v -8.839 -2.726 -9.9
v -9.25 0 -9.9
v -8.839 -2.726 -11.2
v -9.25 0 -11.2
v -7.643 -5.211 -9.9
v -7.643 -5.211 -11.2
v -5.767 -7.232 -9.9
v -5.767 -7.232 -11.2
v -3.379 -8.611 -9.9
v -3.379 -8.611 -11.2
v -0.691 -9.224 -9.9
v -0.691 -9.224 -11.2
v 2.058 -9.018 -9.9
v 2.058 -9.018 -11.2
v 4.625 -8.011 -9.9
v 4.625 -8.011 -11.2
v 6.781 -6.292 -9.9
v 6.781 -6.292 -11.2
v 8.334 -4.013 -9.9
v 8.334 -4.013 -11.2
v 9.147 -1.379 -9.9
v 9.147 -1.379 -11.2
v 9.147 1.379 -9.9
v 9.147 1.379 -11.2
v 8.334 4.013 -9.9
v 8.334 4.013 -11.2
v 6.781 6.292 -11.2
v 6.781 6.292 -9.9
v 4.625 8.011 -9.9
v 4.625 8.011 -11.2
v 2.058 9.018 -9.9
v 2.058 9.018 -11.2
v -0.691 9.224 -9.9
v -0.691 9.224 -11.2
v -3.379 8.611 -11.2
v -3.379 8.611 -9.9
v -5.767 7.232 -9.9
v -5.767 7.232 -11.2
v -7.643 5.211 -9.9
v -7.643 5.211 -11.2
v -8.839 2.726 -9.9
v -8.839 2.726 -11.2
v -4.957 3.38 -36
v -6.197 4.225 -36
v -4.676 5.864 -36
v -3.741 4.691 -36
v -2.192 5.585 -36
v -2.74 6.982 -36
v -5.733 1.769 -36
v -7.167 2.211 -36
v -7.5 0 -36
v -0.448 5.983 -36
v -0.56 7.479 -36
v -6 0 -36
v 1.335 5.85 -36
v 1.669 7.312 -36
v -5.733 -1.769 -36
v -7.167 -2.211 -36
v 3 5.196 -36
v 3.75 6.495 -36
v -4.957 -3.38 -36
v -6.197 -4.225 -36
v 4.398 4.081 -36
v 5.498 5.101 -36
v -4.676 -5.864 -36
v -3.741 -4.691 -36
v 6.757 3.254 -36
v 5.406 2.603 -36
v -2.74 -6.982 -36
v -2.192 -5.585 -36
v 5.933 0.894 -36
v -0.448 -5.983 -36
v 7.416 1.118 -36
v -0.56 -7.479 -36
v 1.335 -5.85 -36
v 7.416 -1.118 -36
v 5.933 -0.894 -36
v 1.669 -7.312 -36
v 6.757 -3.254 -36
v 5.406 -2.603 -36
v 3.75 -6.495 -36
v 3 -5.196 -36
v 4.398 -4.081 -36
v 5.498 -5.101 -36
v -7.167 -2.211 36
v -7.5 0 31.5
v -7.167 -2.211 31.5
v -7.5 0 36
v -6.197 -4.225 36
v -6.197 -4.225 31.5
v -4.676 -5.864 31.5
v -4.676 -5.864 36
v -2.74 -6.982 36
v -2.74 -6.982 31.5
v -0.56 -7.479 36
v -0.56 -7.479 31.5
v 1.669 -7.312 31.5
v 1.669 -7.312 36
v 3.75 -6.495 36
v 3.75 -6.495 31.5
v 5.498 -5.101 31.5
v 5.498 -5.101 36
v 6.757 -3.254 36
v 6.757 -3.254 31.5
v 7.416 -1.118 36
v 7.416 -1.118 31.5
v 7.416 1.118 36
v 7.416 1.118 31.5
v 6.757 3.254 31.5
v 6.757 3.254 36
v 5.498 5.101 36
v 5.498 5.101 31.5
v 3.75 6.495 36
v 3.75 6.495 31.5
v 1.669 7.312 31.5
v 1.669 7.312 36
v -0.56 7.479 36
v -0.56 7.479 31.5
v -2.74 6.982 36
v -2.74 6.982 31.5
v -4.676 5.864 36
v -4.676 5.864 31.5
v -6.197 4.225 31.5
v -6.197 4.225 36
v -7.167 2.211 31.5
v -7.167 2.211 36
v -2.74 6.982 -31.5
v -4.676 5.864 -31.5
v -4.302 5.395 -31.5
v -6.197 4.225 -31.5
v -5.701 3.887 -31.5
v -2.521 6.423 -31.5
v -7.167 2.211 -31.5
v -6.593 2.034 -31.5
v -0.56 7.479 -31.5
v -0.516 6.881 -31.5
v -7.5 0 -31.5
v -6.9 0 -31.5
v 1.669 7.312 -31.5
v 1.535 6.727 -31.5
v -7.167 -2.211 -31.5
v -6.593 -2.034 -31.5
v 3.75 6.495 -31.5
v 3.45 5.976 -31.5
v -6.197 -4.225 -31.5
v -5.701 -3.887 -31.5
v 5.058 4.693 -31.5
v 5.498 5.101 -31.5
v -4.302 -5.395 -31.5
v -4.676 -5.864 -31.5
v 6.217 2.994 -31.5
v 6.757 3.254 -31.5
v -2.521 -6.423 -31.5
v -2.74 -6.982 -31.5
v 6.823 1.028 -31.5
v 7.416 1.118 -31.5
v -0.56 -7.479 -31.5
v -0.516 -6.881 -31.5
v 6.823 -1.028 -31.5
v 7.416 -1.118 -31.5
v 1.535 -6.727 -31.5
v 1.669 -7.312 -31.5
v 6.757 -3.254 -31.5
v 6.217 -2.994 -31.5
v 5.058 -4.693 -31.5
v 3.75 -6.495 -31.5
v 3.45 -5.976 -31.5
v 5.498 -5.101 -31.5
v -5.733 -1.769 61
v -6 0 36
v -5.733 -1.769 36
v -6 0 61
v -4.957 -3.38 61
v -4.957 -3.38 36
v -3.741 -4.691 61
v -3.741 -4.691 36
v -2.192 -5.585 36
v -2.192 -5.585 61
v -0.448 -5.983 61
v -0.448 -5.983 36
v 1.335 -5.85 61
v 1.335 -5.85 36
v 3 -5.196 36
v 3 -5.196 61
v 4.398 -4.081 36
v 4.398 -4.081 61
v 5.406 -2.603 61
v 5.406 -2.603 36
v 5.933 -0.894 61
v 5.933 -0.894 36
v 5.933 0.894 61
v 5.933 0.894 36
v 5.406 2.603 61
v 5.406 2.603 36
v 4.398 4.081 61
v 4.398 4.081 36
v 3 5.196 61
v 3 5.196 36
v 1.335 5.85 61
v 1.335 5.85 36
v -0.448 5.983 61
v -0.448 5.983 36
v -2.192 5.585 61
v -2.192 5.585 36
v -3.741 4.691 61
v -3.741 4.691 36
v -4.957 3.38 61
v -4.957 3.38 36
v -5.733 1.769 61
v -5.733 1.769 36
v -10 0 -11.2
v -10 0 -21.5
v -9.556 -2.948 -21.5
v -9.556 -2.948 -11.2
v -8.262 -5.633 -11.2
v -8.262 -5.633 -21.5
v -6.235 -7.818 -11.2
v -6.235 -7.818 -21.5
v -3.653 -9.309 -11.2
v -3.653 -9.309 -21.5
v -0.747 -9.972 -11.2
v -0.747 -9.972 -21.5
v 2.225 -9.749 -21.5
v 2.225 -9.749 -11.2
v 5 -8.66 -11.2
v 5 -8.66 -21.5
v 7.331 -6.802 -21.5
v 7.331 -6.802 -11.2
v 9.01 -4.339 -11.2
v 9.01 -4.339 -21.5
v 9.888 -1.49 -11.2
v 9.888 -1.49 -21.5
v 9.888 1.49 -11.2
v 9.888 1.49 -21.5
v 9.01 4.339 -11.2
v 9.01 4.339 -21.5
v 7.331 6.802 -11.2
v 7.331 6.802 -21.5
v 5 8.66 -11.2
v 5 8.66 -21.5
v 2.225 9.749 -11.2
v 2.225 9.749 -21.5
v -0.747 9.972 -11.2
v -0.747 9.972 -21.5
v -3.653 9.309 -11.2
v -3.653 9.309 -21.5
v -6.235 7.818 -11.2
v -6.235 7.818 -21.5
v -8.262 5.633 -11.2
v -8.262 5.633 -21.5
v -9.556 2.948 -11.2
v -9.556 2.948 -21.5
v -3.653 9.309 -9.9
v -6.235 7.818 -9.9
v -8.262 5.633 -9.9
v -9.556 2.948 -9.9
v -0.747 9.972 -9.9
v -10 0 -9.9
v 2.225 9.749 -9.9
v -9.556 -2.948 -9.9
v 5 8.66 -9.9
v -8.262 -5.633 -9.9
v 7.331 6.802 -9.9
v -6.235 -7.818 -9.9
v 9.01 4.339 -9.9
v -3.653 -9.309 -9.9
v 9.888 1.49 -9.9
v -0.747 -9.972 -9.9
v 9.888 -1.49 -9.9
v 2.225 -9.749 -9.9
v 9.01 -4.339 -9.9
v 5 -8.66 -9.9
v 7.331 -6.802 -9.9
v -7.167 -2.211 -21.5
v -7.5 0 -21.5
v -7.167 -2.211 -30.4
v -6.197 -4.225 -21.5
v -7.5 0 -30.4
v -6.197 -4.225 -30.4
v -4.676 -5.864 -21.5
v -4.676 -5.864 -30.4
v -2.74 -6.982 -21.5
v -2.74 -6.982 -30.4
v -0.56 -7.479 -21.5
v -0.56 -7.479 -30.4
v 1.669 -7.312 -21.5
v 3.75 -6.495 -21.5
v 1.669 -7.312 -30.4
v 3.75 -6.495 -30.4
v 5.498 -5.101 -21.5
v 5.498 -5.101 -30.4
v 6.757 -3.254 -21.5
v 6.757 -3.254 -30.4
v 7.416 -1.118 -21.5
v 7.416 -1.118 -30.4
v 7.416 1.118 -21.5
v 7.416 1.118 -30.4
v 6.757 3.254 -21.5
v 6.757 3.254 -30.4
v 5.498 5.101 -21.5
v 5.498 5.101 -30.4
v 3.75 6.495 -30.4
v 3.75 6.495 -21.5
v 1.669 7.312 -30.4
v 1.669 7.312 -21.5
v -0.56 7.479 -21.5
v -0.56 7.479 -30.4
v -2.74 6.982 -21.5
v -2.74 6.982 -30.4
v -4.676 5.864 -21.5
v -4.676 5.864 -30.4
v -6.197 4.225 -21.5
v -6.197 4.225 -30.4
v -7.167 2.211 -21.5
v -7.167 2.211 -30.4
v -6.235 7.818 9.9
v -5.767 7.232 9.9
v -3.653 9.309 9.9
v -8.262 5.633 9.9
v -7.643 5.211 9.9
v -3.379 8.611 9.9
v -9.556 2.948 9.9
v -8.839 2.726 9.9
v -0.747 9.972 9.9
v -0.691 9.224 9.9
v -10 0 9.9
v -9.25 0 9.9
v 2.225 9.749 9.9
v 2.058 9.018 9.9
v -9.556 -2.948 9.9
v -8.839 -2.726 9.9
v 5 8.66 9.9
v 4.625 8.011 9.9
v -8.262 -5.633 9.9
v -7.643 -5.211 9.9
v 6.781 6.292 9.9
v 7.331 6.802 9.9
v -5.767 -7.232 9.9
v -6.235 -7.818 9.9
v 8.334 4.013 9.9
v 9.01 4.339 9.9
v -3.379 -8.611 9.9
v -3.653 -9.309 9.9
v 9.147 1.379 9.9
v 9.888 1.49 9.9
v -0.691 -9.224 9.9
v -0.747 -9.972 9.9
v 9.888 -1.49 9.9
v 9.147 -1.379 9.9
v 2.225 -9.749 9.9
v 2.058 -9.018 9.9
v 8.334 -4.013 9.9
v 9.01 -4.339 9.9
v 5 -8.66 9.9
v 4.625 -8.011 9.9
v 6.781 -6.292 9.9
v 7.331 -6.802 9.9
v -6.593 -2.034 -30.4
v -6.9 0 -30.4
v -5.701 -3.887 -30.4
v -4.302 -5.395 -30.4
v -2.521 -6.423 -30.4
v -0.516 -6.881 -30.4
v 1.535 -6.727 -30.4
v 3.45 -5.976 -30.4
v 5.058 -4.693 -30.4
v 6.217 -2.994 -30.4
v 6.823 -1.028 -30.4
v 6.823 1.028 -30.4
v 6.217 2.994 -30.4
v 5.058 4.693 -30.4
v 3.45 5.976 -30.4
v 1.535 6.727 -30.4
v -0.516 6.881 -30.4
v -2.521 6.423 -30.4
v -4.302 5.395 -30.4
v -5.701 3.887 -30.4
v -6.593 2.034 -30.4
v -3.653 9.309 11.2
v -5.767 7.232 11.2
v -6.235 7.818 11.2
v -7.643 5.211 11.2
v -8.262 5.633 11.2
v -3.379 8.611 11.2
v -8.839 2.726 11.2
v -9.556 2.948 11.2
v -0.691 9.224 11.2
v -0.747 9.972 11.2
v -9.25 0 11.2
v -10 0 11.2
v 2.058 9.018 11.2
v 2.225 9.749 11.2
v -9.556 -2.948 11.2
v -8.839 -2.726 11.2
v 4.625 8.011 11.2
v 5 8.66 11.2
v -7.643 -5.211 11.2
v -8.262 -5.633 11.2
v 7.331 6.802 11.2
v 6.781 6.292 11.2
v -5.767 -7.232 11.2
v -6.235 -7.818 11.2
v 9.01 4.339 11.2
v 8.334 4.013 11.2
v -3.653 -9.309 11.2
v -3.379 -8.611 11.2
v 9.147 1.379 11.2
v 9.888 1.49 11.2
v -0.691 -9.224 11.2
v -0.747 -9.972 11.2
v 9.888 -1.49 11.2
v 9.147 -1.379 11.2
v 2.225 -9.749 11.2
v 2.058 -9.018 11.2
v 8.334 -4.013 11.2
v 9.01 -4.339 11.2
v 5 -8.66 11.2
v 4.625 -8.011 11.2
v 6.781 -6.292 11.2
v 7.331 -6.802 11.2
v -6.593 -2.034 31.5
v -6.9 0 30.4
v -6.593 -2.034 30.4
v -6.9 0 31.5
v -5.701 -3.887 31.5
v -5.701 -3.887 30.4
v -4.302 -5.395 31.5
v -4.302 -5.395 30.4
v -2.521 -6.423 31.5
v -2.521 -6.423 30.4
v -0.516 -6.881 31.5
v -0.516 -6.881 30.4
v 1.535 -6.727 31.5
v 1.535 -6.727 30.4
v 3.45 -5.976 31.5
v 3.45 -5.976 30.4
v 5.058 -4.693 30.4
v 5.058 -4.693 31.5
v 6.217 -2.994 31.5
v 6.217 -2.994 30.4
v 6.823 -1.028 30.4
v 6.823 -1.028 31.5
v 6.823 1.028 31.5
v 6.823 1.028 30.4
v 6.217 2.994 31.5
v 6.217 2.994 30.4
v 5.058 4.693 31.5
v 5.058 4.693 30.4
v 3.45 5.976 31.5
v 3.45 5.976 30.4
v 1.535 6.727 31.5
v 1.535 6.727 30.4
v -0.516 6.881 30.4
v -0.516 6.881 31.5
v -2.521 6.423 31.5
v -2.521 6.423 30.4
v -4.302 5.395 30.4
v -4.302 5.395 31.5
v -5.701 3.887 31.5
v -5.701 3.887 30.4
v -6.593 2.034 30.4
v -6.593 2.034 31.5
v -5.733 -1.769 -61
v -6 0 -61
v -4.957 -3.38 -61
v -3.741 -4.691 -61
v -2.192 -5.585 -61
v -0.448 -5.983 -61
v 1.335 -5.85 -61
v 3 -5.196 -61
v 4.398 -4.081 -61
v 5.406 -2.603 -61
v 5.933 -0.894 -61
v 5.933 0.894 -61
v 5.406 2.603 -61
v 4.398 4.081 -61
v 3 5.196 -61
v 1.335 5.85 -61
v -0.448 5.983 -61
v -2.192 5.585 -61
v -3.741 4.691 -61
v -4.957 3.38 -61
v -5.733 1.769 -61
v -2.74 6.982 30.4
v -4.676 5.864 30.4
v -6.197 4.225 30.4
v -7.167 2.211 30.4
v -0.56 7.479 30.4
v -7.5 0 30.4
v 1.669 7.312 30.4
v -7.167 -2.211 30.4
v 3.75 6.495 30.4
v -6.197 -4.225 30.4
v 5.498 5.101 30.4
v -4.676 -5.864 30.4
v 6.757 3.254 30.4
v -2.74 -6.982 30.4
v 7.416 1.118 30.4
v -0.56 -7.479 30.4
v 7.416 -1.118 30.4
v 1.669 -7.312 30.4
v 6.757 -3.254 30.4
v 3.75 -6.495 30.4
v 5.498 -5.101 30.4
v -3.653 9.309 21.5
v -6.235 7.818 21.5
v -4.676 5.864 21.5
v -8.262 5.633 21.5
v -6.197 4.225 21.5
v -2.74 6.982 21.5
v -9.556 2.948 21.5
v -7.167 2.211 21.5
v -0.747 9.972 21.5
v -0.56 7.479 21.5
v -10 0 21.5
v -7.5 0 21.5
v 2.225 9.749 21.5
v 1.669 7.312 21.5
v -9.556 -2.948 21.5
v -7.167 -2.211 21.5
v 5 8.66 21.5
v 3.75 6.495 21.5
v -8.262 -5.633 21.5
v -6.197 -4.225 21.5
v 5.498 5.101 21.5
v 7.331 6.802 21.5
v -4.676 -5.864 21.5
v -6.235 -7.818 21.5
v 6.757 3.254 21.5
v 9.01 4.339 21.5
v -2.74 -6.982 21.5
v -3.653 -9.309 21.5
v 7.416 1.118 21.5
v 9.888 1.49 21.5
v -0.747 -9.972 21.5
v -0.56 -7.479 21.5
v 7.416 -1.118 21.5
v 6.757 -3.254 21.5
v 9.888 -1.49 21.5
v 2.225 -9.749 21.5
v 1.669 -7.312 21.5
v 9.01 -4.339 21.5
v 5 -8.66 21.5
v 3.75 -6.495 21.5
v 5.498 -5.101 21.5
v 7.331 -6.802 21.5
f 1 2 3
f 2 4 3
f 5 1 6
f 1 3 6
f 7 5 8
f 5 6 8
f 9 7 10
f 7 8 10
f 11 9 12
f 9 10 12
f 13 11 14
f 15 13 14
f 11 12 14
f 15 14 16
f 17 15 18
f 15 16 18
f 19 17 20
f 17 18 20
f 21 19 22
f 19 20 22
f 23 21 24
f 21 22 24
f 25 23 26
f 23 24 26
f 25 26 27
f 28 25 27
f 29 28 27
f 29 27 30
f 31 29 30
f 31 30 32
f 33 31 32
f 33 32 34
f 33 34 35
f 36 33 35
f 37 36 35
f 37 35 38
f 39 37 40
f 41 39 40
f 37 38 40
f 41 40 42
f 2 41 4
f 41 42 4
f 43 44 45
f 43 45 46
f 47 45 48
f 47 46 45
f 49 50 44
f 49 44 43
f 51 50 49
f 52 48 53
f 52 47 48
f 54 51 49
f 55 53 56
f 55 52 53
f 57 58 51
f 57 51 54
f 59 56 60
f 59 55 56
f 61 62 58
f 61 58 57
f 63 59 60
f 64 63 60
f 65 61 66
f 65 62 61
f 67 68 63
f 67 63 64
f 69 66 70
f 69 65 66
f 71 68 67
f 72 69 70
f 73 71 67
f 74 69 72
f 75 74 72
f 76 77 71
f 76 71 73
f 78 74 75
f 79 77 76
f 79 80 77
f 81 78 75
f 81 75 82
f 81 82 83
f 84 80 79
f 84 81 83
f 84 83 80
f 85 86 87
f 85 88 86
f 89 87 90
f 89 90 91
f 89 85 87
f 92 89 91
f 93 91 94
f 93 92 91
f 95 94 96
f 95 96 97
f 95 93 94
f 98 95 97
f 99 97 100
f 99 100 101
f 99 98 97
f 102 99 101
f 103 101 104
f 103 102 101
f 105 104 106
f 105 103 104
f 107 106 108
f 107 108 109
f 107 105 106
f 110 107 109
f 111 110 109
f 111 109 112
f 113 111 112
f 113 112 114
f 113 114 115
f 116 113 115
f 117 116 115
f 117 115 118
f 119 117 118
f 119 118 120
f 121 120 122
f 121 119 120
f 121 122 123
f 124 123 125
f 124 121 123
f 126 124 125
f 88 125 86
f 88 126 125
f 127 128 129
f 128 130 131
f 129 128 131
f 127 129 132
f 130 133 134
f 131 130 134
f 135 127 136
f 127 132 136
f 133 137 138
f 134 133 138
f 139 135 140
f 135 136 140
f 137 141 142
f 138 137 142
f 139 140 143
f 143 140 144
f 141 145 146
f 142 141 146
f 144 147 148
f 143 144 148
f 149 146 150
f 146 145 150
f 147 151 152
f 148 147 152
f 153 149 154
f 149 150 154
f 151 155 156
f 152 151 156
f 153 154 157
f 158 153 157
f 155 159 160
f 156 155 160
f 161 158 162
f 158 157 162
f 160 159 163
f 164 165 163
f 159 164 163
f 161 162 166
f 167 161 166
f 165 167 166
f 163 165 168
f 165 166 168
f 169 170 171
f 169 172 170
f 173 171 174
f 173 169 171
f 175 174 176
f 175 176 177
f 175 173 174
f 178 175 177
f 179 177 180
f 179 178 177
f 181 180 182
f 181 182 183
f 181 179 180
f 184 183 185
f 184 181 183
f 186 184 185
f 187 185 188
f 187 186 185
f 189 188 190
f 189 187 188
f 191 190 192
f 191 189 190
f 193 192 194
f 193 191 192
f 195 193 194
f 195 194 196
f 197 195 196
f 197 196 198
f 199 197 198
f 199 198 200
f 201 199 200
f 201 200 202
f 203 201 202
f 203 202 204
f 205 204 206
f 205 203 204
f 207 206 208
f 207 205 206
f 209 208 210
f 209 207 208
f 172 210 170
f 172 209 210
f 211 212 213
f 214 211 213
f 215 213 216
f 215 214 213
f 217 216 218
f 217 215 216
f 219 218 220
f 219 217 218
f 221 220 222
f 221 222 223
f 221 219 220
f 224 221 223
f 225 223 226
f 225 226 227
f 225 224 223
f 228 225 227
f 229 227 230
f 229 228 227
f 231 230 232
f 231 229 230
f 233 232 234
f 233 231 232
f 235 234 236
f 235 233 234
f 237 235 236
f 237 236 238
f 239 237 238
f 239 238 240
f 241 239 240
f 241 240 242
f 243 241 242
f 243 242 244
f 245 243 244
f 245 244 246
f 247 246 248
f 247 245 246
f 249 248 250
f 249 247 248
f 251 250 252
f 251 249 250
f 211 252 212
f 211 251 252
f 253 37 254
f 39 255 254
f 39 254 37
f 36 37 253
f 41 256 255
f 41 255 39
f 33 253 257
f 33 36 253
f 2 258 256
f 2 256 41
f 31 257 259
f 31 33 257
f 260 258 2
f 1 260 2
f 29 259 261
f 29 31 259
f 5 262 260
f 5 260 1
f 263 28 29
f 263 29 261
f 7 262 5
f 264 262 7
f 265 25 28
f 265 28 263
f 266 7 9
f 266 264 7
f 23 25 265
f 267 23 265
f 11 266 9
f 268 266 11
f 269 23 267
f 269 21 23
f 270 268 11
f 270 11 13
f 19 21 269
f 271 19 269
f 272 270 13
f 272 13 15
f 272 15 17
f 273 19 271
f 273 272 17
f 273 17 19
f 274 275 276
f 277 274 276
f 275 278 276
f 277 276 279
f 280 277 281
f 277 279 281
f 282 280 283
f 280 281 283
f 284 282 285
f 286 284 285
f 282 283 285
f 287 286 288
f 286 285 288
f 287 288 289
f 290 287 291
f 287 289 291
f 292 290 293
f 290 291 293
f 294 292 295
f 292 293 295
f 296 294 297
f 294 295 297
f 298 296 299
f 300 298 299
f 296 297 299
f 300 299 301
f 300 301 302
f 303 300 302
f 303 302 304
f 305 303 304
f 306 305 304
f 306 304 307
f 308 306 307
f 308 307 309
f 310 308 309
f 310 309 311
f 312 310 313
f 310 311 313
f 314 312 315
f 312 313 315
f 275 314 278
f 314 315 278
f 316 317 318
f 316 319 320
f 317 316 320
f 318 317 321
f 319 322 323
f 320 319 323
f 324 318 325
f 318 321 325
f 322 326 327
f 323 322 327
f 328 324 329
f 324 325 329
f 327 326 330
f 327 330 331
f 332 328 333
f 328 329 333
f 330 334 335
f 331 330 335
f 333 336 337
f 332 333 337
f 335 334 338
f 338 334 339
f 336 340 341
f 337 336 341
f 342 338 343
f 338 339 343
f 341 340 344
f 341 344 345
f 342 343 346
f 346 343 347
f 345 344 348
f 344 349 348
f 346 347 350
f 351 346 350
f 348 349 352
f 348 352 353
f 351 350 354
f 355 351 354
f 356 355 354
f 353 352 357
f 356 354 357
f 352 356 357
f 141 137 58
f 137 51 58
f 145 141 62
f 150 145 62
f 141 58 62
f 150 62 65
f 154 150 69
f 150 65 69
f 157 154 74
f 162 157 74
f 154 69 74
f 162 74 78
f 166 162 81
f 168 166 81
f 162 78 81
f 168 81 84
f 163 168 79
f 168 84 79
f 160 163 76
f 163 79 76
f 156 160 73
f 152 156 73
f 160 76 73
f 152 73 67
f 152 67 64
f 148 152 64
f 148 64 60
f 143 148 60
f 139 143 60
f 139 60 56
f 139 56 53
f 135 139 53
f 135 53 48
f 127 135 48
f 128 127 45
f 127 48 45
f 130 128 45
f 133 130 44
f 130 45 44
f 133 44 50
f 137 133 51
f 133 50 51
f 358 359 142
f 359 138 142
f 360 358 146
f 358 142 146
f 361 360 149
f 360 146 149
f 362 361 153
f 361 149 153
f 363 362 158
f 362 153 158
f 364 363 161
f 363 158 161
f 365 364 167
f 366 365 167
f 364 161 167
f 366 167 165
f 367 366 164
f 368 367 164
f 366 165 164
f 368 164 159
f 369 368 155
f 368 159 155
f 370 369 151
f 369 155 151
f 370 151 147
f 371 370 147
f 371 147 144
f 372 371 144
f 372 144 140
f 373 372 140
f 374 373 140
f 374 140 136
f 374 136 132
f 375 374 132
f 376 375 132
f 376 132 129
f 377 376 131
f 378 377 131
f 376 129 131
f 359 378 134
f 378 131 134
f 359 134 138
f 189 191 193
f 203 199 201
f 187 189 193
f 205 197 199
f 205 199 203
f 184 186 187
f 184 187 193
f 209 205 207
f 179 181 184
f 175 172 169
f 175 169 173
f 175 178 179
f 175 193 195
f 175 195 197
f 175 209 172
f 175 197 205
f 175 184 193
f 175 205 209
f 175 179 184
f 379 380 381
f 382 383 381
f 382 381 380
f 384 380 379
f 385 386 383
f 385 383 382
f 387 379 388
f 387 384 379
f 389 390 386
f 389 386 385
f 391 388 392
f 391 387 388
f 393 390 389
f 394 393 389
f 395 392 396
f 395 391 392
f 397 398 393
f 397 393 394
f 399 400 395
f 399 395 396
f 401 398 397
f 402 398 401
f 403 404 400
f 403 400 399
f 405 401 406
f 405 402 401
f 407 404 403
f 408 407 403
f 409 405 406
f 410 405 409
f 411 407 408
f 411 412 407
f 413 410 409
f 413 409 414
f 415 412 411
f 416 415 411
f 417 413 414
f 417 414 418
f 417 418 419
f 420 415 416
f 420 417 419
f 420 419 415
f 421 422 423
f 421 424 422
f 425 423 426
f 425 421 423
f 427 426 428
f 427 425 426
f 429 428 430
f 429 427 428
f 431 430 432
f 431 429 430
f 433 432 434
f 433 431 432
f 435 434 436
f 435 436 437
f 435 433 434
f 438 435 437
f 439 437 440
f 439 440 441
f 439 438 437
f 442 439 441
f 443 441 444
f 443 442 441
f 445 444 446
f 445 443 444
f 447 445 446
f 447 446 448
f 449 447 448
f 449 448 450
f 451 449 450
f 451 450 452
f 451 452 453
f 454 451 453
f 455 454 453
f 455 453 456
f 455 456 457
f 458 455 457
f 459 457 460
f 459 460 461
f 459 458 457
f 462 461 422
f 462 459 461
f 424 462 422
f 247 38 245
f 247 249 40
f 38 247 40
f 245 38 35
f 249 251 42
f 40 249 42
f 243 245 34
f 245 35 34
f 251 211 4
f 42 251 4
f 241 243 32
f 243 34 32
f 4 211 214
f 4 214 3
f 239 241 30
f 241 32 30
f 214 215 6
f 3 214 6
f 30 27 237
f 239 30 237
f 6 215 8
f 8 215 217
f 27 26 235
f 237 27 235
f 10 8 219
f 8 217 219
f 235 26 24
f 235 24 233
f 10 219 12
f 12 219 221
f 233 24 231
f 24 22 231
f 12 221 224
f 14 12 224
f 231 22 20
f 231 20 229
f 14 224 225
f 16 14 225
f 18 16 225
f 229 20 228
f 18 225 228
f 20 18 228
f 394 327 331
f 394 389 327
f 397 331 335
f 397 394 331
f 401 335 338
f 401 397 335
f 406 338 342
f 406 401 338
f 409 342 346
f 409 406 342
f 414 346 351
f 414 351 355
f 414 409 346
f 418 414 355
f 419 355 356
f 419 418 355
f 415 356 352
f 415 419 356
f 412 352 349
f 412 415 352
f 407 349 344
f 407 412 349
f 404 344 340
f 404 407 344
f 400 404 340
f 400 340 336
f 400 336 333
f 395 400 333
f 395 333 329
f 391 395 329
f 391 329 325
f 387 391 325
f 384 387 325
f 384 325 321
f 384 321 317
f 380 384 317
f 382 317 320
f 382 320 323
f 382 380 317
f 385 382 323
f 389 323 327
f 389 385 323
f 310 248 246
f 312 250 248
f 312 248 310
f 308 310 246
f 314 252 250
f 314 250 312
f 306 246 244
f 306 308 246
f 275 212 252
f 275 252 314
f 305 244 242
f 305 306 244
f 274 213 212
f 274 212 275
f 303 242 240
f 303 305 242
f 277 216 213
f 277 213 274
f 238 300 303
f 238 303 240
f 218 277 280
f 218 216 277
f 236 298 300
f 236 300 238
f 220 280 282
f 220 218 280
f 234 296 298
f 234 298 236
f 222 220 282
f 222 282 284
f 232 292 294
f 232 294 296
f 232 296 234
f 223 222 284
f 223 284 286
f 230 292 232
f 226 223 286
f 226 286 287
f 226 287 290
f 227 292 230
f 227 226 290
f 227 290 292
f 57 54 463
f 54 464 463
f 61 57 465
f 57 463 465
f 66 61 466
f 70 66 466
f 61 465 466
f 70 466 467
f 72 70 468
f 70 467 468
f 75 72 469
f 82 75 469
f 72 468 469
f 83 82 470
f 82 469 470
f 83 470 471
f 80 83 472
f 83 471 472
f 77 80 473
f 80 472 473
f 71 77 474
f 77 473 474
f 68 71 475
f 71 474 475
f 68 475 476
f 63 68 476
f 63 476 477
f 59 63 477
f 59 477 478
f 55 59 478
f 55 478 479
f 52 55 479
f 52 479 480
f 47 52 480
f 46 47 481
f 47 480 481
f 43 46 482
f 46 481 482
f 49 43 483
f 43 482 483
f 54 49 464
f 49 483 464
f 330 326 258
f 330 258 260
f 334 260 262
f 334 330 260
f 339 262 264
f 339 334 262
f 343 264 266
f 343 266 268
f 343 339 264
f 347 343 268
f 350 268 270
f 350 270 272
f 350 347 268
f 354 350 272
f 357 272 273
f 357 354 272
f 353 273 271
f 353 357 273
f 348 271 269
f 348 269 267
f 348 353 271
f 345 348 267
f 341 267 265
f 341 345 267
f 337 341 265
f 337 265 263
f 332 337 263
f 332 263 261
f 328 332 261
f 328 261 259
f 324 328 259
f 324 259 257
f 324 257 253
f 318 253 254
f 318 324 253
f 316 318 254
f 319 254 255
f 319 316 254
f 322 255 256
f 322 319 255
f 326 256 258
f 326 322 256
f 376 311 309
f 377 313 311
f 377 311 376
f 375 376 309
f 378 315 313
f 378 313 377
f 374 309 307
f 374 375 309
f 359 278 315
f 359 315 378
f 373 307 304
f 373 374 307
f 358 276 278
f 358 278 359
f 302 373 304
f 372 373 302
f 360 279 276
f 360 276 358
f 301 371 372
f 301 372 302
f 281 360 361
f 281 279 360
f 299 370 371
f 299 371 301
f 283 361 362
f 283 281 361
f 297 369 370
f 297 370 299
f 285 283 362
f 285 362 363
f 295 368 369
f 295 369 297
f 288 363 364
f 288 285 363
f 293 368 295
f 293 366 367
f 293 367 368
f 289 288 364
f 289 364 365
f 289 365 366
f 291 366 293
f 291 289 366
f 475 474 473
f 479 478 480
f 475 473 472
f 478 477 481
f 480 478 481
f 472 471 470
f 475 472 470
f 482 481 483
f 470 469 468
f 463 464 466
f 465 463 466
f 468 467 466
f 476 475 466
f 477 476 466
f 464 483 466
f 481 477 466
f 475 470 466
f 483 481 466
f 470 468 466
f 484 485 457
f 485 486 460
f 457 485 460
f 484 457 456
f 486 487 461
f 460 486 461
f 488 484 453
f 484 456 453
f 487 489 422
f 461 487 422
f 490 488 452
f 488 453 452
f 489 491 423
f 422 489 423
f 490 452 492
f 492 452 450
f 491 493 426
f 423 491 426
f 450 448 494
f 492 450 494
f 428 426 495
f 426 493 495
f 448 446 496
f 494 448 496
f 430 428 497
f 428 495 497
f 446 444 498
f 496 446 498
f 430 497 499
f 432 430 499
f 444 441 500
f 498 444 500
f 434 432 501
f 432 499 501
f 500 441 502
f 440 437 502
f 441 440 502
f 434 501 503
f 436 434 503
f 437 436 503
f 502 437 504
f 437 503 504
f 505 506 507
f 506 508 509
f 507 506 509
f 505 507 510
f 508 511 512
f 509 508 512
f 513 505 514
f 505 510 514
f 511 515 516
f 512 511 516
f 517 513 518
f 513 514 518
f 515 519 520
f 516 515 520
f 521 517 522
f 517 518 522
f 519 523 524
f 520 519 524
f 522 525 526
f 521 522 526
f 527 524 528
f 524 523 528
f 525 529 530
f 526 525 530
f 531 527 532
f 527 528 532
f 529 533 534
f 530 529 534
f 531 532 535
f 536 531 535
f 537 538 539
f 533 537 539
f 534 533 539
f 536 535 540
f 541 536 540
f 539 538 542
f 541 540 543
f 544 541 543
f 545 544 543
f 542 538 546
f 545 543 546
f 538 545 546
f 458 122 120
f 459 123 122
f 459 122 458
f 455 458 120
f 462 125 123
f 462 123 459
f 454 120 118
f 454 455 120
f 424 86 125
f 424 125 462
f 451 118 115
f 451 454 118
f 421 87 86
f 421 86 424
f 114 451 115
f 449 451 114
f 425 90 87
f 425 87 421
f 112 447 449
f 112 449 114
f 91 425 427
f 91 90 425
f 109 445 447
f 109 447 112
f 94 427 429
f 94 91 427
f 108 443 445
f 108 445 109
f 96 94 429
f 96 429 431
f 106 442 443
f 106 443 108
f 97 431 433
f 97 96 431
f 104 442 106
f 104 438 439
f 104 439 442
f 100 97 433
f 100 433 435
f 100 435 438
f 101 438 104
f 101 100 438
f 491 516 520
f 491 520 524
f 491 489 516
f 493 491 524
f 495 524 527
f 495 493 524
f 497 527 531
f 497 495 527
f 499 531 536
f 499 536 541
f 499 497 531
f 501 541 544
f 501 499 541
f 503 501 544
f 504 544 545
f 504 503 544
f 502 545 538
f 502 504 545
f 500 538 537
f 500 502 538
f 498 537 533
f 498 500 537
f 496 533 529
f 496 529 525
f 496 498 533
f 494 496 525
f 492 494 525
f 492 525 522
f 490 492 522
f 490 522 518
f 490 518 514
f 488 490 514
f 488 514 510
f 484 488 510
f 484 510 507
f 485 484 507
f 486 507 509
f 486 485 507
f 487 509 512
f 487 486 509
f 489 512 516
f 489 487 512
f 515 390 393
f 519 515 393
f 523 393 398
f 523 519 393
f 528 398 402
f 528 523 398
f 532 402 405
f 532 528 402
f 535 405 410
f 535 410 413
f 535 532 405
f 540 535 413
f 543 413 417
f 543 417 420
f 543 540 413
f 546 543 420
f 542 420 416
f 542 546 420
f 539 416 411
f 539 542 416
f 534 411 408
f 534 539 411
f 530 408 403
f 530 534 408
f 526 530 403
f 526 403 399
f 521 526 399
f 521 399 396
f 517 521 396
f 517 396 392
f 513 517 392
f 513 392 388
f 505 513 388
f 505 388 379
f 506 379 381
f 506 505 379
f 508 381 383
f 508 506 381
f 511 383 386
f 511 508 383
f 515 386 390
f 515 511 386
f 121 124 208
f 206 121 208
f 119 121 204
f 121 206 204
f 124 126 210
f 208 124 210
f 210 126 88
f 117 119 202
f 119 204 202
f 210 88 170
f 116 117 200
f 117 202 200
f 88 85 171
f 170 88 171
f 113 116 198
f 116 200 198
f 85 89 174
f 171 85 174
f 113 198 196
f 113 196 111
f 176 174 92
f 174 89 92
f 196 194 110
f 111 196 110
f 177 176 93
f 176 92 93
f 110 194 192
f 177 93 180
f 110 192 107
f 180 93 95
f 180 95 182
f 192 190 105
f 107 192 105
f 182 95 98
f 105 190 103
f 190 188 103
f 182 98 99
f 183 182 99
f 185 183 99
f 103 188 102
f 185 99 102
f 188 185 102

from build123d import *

# Parameters (mm, degrees)
SKETCH1_R           = 10
BOSS_EXTRUDE1_DEPTH = 61
SKETCH2_W           = 39.5
SKETCH2_H           = 2.5
SKETCH3_W           = 25
SKETCH3_H           = 1.5
SKETCH4_W           = 1.1
SKETCH4_H           = 0.6
SKETCH5_W           = 1.3
SKETCH5_H           = 0.75


with BuildPart() as part:
    # Sketch1 → Boss-Extrude1 (new, symmetric)
    with BuildSketch(Plane.XY):
        with Locations(Location((0, 0, 0), (0, 0, 180))):
            Circle(SKETCH1_R)
    extrude(amount=BOSS_EXTRUDE1_DEPTH, both=True)

    # Sketch2 → Cut-Revolve1 (revolve, cut)
    with BuildSketch(Plane(origin=(0, 0, 0), x_dir=(0, 0, -1), z_dir=(1, 0, 0)), mode=Mode.PRIVATE) as cut_revolve1_sk:
        with Locations((41.25, 8.75)):
            Rectangle(SKETCH2_W, SKETCH2_H)
    cut_revolve1 = revolve(cut_revolve1_sk.sketch.rotate(Axis((0, 0, -67.1), (0, 0, 1)), 90), axis=Axis((0, 0, -67.1), (0, 0, 1)), mode=Mode.SUBTRACT)

    # Mirror1: Cut-Revolve1 across plane
    add(cut_revolve1.mirror(Plane.XY), mode=Mode.SUBTRACT)

    # Sketch3 → Cut-Revolve2 (revolve, cut)
    with BuildSketch(Plane(origin=(0, 0, 0), x_dir=(0, 0, -1), z_dir=(1, 0, 0)), mode=Mode.PRIVATE) as cut_revolve2_sk:
        with Locations((48.5, 6.75)):
            Rectangle(SKETCH3_W, SKETCH3_H)
    cut_revolve2 = revolve(cut_revolve2_sk.sketch.rotate(Axis((0, 0, -67.1), (0, 0, 1)), 90), axis=Axis((0, 0, -67.1), (0, 0, 1)), mode=Mode.SUBTRACT)

    # Mirror2: Cut-Revolve2 across plane
    add(cut_revolve2.mirror(Plane.XY), mode=Mode.SUBTRACT)

    # Sketch4 → Cut-Revolve3 (revolve, cut)
    with BuildSketch(Plane(origin=(0, 0, 0), x_dir=(0, 0, -1), z_dir=(1, 0, 0)), mode=Mode.PRIVATE) as cut_revolve3_sk:
        with Locations((30.95, 7.2)):
            Rectangle(SKETCH4_W, SKETCH4_H)
    cut_revolve3 = revolve(cut_revolve3_sk.sketch.rotate(Axis((0, 0, -67.1), (0, 0, 1)), 90), axis=Axis((0, 0, -67.1), (0, 0, 1)), mode=Mode.SUBTRACT)

    # Mirror3: Cut-Revolve3 across plane
    add(cut_revolve3.mirror(Plane.XY), mode=Mode.SUBTRACT)

    # Sketch5 → Cut-Revolve4 (revolve, cut)
    with BuildSketch(Plane(origin=(0, 0, 0), x_dir=(0, 0, -1), z_dir=(1, 0, 0)), mode=Mode.PRIVATE) as cut_revolve4_sk:
        with Locations((10.55, 9.625)):
            Rectangle(SKETCH5_W, SKETCH5_H)
    cut_revolve4 = revolve(cut_revolve4_sk.sketch.rotate(Axis((0, 0, -67.1), (0, 0, 1)), 90), axis=Axis((0, 0, -67.1), (0, 0, 1)), mode=Mode.SUBTRACT)

    # Mirror4: Cut-Revolve4 across plane
    add(cut_revolve4.mirror(Plane.XY), mode=Mode.SUBTRACT)


solid = part.part
